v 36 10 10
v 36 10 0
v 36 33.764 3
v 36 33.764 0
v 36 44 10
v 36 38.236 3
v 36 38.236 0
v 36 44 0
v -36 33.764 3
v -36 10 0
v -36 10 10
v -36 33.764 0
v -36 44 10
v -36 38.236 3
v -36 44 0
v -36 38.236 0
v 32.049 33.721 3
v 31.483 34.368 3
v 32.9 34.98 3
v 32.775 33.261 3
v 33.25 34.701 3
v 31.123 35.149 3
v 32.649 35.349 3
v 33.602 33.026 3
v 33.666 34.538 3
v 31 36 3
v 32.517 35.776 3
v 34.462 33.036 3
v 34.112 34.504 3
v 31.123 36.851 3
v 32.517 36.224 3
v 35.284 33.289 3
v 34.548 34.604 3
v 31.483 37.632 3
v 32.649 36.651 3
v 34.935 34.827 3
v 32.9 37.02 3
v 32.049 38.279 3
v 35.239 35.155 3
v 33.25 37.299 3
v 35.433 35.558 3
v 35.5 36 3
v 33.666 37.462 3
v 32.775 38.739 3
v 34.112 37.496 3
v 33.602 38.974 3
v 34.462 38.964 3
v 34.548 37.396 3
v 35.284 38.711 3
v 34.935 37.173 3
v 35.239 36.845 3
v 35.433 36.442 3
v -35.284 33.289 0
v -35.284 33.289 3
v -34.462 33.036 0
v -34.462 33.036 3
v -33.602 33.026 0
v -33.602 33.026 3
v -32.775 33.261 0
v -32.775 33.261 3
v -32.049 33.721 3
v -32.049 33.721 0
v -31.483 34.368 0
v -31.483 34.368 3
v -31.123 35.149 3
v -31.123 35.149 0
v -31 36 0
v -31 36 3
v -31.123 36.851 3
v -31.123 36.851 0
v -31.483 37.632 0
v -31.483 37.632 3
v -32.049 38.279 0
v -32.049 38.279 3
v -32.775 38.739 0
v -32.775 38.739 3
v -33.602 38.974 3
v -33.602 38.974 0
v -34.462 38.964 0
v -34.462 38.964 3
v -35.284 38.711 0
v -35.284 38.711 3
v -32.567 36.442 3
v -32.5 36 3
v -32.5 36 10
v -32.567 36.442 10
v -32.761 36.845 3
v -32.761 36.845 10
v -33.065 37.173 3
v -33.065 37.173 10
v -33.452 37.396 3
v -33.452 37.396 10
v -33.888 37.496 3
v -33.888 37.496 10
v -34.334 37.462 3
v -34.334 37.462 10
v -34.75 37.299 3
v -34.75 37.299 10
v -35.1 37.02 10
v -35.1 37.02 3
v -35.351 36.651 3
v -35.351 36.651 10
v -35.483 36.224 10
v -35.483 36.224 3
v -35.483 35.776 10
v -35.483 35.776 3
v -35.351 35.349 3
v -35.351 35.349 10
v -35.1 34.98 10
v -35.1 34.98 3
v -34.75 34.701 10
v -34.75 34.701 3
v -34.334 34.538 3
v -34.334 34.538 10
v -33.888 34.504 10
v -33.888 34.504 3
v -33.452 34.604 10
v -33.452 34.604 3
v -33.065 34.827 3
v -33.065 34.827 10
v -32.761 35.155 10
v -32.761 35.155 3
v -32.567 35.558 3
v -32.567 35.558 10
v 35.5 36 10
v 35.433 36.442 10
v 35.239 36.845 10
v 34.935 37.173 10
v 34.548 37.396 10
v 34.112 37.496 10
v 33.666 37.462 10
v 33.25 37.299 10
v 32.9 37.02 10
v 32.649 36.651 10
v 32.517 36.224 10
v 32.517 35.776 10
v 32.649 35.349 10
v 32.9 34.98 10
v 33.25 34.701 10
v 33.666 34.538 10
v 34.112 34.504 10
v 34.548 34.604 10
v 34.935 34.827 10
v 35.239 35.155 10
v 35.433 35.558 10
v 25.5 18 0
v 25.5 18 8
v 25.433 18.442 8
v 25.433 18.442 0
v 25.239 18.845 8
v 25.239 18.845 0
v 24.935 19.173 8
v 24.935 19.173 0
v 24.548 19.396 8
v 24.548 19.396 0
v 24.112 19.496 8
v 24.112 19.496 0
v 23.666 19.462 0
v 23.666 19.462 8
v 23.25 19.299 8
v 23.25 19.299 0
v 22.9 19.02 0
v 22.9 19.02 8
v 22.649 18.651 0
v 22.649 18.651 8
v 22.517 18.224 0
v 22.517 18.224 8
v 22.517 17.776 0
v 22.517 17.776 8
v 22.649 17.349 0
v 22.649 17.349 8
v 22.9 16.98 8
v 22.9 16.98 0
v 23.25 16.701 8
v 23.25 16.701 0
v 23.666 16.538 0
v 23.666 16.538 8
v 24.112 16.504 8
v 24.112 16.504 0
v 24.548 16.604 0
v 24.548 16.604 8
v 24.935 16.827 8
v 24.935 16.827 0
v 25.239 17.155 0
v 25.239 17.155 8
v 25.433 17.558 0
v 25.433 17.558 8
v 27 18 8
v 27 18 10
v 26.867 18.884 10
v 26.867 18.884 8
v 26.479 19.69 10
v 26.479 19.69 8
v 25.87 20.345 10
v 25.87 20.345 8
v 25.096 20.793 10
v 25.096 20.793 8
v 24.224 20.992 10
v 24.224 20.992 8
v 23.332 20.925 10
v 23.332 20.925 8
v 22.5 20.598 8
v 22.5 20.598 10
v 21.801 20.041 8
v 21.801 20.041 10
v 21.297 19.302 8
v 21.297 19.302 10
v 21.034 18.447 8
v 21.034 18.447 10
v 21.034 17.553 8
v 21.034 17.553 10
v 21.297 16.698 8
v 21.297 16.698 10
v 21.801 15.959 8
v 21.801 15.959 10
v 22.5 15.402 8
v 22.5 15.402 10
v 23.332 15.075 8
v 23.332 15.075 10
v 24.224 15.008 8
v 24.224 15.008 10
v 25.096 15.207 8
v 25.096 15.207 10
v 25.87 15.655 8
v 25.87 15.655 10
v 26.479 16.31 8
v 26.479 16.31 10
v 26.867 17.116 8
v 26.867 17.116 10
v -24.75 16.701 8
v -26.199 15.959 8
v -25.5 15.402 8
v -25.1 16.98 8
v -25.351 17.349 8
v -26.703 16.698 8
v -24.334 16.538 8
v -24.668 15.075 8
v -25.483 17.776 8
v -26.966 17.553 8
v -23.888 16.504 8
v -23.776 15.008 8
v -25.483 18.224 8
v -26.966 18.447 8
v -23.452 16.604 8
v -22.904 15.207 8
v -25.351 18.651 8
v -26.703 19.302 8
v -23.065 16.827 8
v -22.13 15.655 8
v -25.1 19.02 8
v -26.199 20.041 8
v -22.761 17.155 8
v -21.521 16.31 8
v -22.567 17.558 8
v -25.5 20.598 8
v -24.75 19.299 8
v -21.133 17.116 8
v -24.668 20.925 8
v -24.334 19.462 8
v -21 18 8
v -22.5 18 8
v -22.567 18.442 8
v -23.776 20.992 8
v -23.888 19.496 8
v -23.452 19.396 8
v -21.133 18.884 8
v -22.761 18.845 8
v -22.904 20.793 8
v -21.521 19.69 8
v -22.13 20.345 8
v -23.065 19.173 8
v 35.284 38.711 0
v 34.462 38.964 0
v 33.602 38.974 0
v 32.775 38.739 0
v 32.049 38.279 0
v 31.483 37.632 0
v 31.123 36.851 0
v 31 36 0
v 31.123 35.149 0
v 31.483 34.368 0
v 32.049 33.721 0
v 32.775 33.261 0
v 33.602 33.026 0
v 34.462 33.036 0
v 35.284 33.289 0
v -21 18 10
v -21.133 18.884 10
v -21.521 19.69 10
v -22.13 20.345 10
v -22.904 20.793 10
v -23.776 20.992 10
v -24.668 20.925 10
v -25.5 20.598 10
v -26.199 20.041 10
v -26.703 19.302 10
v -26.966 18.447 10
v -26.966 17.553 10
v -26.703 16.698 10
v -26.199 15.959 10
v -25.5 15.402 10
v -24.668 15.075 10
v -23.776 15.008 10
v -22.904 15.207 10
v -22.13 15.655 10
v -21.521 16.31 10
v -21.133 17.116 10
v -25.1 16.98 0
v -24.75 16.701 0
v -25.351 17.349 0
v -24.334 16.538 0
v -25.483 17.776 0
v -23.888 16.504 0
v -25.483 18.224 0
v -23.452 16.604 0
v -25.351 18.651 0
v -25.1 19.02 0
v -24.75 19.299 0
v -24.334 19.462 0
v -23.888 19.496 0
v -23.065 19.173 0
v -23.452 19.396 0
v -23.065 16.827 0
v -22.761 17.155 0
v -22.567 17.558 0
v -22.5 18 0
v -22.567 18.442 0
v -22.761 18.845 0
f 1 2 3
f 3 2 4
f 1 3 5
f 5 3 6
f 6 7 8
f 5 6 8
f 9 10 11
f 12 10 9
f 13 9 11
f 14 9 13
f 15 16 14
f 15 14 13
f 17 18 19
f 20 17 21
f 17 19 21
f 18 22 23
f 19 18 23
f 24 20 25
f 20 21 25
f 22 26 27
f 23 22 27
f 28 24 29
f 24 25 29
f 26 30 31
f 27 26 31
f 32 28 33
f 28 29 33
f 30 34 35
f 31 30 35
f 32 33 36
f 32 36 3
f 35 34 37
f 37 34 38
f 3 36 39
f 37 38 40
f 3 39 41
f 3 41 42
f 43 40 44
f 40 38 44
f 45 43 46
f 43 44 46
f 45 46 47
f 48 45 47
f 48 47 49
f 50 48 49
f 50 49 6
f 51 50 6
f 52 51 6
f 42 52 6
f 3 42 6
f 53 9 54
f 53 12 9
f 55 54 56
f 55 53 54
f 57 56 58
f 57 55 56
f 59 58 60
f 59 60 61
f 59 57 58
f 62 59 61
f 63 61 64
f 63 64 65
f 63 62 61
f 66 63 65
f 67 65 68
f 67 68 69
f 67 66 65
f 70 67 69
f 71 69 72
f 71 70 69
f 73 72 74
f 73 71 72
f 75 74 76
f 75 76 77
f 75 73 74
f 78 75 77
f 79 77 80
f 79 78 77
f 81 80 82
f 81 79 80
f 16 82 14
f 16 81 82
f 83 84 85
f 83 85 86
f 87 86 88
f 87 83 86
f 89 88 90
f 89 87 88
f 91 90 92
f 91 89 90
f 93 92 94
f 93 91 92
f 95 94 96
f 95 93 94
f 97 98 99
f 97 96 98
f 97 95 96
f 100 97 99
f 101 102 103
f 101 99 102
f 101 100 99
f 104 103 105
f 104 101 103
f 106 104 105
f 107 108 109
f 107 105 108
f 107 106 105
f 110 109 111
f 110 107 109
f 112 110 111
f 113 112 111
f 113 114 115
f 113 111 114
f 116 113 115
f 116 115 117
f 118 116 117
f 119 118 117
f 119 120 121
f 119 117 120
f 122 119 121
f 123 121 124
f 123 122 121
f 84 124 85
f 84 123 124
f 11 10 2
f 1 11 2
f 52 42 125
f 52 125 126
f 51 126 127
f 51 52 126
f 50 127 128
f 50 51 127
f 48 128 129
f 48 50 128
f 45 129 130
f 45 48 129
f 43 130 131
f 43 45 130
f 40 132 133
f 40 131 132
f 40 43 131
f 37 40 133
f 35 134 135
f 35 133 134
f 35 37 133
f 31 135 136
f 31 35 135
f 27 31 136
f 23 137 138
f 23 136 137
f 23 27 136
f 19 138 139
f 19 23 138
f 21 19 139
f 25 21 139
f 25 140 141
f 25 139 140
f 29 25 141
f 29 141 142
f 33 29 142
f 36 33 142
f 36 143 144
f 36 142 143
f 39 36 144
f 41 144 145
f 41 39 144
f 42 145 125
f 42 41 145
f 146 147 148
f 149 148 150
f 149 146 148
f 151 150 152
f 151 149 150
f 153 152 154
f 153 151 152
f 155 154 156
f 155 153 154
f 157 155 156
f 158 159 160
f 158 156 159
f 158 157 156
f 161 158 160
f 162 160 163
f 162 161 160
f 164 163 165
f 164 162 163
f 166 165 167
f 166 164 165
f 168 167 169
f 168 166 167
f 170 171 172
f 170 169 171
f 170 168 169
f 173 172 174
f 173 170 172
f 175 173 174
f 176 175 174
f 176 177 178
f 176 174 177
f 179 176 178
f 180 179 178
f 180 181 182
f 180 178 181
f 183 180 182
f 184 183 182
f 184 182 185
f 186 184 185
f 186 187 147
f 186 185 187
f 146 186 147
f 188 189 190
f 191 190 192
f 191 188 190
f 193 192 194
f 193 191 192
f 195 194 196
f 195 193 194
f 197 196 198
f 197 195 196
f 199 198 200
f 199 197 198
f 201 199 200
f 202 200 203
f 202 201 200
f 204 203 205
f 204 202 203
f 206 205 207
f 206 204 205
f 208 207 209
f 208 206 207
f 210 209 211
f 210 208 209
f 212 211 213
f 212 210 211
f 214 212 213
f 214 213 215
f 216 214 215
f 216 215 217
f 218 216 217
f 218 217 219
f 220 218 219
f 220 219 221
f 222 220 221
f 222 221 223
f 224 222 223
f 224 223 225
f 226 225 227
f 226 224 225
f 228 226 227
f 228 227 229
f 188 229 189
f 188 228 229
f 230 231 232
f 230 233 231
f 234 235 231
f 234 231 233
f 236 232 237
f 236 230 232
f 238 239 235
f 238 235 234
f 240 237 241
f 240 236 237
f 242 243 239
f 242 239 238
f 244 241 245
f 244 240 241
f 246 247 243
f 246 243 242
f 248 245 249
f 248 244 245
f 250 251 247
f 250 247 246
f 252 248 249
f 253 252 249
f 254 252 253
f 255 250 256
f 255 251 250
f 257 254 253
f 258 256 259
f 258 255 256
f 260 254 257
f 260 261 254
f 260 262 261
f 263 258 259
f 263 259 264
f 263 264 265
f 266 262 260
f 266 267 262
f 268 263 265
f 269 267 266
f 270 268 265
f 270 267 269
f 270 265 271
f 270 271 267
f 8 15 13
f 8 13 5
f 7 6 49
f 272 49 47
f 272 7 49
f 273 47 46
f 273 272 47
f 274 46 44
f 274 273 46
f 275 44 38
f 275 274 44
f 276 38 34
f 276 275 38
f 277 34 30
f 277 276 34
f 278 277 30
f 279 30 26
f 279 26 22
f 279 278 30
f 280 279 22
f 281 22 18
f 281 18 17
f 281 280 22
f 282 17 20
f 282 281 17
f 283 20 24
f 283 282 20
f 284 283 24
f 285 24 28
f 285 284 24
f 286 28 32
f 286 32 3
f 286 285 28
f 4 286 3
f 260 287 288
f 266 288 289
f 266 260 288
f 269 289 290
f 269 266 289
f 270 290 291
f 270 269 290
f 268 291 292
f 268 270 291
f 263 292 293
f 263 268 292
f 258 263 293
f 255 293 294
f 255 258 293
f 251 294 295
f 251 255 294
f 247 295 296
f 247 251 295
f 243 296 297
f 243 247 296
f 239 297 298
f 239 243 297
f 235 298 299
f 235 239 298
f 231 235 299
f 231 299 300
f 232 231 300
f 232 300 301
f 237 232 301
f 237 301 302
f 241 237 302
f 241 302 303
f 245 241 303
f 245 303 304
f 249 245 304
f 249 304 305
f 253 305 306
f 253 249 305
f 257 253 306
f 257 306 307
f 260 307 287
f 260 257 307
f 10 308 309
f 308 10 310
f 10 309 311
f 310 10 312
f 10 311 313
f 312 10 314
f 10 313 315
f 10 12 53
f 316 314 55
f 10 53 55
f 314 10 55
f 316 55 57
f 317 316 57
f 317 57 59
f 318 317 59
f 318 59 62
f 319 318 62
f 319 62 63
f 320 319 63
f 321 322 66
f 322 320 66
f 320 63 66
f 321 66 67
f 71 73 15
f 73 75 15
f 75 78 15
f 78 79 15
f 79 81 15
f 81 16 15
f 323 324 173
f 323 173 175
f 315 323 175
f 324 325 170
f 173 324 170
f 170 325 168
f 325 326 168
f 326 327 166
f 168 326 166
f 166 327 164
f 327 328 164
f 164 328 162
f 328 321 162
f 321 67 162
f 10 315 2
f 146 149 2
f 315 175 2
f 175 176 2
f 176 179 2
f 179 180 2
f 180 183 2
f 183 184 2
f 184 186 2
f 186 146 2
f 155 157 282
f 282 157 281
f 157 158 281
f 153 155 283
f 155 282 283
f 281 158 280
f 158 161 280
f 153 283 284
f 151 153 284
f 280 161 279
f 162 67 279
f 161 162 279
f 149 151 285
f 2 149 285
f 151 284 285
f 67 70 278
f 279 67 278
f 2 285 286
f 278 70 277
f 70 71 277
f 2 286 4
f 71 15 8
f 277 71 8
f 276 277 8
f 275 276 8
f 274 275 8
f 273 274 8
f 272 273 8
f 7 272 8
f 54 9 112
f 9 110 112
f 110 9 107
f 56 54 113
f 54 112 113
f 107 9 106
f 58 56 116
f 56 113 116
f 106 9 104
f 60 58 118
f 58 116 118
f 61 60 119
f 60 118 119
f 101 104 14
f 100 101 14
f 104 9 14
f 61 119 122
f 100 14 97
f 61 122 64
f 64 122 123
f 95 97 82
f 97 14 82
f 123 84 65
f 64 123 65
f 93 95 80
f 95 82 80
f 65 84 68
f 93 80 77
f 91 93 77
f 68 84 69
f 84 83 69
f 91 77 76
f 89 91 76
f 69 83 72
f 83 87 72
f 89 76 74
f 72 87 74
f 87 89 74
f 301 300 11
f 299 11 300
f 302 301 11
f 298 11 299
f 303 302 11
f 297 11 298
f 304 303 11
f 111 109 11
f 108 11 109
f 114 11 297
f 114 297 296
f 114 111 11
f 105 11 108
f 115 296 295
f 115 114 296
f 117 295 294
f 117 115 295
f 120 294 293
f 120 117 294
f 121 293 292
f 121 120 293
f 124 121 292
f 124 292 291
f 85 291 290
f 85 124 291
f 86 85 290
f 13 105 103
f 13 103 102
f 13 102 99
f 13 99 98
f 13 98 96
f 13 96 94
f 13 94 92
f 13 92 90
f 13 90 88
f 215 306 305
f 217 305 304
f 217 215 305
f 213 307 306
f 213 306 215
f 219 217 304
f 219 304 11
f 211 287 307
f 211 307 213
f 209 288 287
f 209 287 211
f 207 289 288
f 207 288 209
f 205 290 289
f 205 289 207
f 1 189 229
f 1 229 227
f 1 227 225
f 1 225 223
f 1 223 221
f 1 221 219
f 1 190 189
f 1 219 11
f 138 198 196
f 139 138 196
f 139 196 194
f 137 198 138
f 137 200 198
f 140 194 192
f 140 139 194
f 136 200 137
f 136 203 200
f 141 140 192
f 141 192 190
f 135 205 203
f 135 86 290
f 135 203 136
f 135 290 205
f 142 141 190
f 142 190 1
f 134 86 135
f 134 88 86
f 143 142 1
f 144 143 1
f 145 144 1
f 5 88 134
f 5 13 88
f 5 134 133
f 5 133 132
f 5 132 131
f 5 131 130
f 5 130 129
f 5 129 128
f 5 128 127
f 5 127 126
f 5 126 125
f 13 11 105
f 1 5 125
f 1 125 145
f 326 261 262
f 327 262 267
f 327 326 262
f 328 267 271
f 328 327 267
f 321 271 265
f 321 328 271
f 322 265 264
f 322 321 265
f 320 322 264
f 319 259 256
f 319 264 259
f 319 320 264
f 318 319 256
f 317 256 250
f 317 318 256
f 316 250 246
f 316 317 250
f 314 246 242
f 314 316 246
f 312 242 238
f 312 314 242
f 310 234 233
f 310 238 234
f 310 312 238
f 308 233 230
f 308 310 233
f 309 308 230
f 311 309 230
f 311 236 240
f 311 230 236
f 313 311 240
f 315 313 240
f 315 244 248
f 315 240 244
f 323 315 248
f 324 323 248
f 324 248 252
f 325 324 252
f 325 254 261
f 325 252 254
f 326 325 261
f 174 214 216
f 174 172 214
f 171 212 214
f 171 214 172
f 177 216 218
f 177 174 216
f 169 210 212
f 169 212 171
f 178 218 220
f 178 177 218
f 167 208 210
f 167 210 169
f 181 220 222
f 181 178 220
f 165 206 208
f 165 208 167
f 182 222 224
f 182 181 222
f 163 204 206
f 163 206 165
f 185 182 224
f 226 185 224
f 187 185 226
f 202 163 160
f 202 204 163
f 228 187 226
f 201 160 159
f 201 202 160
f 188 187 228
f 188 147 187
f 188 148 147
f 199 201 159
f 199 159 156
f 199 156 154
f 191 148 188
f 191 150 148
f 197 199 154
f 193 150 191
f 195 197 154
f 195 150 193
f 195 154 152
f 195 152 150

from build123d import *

# Parameters (mm, degrees)
CYLINDER320_R     = 1.5
CYLINDER320_DEPTH = 50
CYLINDER321_R     = 1.5
CYLINDER321_DEPTH = 50
CYLINDER322_R     = 1.5
CYLINDER322_DEPTH = 50
CYLINDER319_R     = 1.5
CYLINDER319_DEPTH = 50
CYLINDER323_R     = 3
CYLINDER323_DEPTH = 4
CYLINDER325_R     = 3
CYLINDER325_DEPTH = 4
CYLINDER326_R     = 3
CYLINDER326_DEPTH = 4
CYLINDER324_R     = 3
CYLINDER324_DEPTH = 4
CYLINDER293_R     = 1.5
CYLINDER293_DEPTH = 50
CYLINDER294_R     = 1.5
CYLINDER294_DEPTH = 50
CYLINDER297_R     = 3
CYLINDER297_DEPTH = 4
CYLINDER298_R     = 3
CYLINDER298_DEPTH = 4
BOX138_W          = 72
BOX138_H          = 34
BOX138_DEPTH      = 10


with BuildPart() as v_lec320:
    # Cylinder320 → Cylinder320 (new body)
    with BuildSketch(Plane(origin=(-51, 6, 0), x_dir=(1, 0, 0), z_dir=(0, 0, 1))):
        Circle(CYLINDER320_R)
    extrude(amount=CYLINDER320_DEPTH)


with BuildPart() as v_lec321:
    # Cylinder321 → Cylinder321 (new body)
    with BuildSketch(Plane(origin=(-24, 18, 0), x_dir=(1, 0, 0), z_dir=(0, 0, 1))):
        Circle(CYLINDER321_R)
    extrude(amount=CYLINDER321_DEPTH)


with BuildPart() as v_lec322:
    # Cylinder322 → Cylinder322 (new body)
    with BuildSketch(Plane(origin=(24, 18, 0), x_dir=(1, 0, 0), z_dir=(0, 0, 1))):
        Circle(CYLINDER322_R)
    extrude(amount=CYLINDER322_DEPTH)


with BuildPart() as compound295:
    # Cylinder319 → Cylinder319 (new body)
    with BuildSketch(Plane(origin=(51, 6, 0), x_dir=(1, 0, 0), z_dir=(0, 0, 1))):
        Circle(CYLINDER319_R)
    extrude(amount=CYLINDER319_DEPTH)

    # Compound295: union Válec320, Válec321, Válec322
    add(v_lec320.part)
    add(v_lec321.part)
    add(v_lec322.part)


with BuildPart() as v_lec323:
    # Cylinder323 → Cylinder323 (new body)
    with BuildSketch(Plane(origin=(-51, 7, 0), x_dir=(1, 0, 0), z_dir=(0, 0, 1))):
        Circle(CYLINDER323_R)
    extrude(amount=CYLINDER323_DEPTH)


with BuildPart() as v_lec325:
    # Cylinder325 → Cylinder325 (new body)
    with BuildSketch(Plane(origin=(-24, 18, 0), x_dir=(1, 0, 0), z_dir=(0, 0, 1))):
        Circle(CYLINDER325_R)
    extrude(amount=CYLINDER325_DEPTH)


with BuildPart() as v_lec326:
    # Cylinder326 → Cylinder326 (new body)
    with BuildSketch(Plane(origin=(24, 18, 0), x_dir=(1, 0, 0), z_dir=(0, 0, 1))):
        Circle(CYLINDER326_R)
    extrude(amount=CYLINDER326_DEPTH)


with BuildPart() as compound296:
    # Cylinder324 → Cylinder324 (new body)
    with BuildSketch(Plane(origin=(51, 7, 0), x_dir=(1, 0, 0), z_dir=(0, 0, 1))):
        Circle(CYLINDER324_R)
    extrude(amount=CYLINDER324_DEPTH)

    # Compound296: union Válec323, Válec325, Válec326
    add(v_lec323.part)
    add(v_lec325.part)
    add(v_lec326.part)


with BuildPart() as compound296_1:
    # Compound296 placement: moved
    add(compound296.part.moved(Location((0, 0, 8))))


with BuildPart() as v_lec293:
    # Cylinder293 → Cylinder293 (new body)
    with BuildSketch(Plane(origin=(34, 36, 0), x_dir=(1, 0, 0), z_dir=(0, 0, 1))):
        Circle(CYLINDER293_R)
    extrude(amount=CYLINDER293_DEPTH)


with BuildPart() as compound284:
    # Cylinder294 → Cylinder294 (new body)
    with BuildSketch(Plane(origin=(-34, 36, 0), x_dir=(1, 0, 0), z_dir=(0, 0, 1))):
        Circle(CYLINDER294_R)
    extrude(amount=CYLINDER294_DEPTH)

    # Compound284: union Válec293
    add(v_lec293.part)


with BuildPart() as v_lec297:
    # Cylinder297 → Cylinder297 (new body)
    with BuildSketch(Plane(origin=(34, 36, -1), x_dir=(1, 0, 0), z_dir=(0, 0, 1))):
        Circle(CYLINDER297_R)
    extrude(amount=CYLINDER297_DEPTH)


with BuildPart() as compound282:
    # Cylinder298 → Cylinder298 (new body)
    with BuildSketch(Plane(origin=(-34, 36, -1), x_dir=(1, 0, 0), z_dir=(0, 0, 1))):
        Circle(CYLINDER298_R)
    extrude(amount=CYLINDER298_DEPTH)

    # Compound282: union Válec297
    add(v_lec297.part)


with BuildPart() as cut141:
    # Box138 → Box138 (new body)
    with BuildSketch(Plane(origin=(-36, 10, 0), x_dir=(1, 0, 0), z_dir=(0, 0, 1))):
        with Locations((36, 17)):
            Rectangle(BOX138_W, BOX138_H)
    extrude(amount=BOX138_DEPTH)

    # Cut131: cut Compound282
    add(compound282.part, mode=Mode.SUBTRACT)

    # Cut132: cut Compound284
    add(compound284.part, mode=Mode.SUBTRACT)

    # Cut140: cut Compound296
    add(compound296_1.part, mode=Mode.SUBTRACT)

    # Cut141: cut Compound295
    add(compound295.part, mode=Mode.SUBTRACT)


solid = cut141.part
